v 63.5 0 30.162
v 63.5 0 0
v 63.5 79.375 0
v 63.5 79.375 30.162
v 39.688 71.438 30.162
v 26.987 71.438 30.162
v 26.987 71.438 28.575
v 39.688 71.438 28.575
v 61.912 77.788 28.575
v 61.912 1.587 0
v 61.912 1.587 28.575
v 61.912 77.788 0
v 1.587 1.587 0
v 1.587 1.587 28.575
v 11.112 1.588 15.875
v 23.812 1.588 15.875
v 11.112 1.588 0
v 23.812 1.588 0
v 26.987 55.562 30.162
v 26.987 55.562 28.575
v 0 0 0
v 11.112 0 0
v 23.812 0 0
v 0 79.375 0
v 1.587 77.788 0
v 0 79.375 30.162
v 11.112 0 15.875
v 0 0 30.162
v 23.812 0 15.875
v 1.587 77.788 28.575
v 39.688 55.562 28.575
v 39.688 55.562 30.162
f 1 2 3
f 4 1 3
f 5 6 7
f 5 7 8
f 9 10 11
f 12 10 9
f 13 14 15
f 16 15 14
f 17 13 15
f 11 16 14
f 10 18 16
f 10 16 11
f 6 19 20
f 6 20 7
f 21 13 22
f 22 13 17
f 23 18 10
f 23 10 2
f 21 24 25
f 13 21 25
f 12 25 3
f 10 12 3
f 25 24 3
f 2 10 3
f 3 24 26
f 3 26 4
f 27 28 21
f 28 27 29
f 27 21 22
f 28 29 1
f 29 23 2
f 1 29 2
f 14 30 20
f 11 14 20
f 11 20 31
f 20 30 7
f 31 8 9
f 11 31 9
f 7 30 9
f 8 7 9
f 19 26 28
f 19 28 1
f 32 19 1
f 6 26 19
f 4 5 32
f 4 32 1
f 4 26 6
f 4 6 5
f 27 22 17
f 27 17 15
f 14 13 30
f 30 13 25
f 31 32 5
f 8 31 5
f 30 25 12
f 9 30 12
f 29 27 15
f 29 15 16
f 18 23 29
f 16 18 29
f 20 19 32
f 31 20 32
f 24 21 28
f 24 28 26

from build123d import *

# Parameters (mm, degrees)
F0_W     = 63.5
F0_H     = 79.375
F0_W_2   = 60.325
F0_H_2   = 76.2
F1_DEPTH = 30.1625
F2_W     = 60.325
F2_H     = 1.5875
F3_DEPTH = 76.2
F4_W     = 12.7
F4_H     = 15.875
F5_DEPTH = 1.5875
F6_W     = 12.7
F6_H     = 15.875
F7_DEPTH = 1.5875


with BuildPart() as f1:
    # F0 (on Top) → F1 (new body)
    with BuildSketch(Plane.XY):
        with Locations((31.75, 39.6875)):
            Rectangle(F0_W, F0_H)
        with Locations((31.75, 39.6875)):
            Rectangle(F0_W_2, F0_H_2, mode=Mode.SUBTRACT)
    extrude(amount=F1_DEPTH)

    # F2 (on face) → F3 (join)
    with BuildSketch(Plane.XZ.offset(-77.7875)):
        with Locations((31.75, 29.36875)):
            Rectangle(F2_W, F2_H)
    extrude(amount=F3_DEPTH)

    # F4 (on face) → F5 (cut)
    with BuildSketch(Plane.XY.offset(30.1625)):
        with Locations((33.3375, 63.5)):
            Rectangle(F4_W, F4_H)
    extrude(amount=-F5_DEPTH, mode=Mode.SUBTRACT)

    # F6 (on face) → F7 (cut)
    with BuildSketch(Plane.XZ):
        with Locations((17.4625, 7.9375)):
            Rectangle(F6_W, F6_H)
    extrude(amount=-F7_DEPTH, mode=Mode.SUBTRACT)


solid = f1.part
